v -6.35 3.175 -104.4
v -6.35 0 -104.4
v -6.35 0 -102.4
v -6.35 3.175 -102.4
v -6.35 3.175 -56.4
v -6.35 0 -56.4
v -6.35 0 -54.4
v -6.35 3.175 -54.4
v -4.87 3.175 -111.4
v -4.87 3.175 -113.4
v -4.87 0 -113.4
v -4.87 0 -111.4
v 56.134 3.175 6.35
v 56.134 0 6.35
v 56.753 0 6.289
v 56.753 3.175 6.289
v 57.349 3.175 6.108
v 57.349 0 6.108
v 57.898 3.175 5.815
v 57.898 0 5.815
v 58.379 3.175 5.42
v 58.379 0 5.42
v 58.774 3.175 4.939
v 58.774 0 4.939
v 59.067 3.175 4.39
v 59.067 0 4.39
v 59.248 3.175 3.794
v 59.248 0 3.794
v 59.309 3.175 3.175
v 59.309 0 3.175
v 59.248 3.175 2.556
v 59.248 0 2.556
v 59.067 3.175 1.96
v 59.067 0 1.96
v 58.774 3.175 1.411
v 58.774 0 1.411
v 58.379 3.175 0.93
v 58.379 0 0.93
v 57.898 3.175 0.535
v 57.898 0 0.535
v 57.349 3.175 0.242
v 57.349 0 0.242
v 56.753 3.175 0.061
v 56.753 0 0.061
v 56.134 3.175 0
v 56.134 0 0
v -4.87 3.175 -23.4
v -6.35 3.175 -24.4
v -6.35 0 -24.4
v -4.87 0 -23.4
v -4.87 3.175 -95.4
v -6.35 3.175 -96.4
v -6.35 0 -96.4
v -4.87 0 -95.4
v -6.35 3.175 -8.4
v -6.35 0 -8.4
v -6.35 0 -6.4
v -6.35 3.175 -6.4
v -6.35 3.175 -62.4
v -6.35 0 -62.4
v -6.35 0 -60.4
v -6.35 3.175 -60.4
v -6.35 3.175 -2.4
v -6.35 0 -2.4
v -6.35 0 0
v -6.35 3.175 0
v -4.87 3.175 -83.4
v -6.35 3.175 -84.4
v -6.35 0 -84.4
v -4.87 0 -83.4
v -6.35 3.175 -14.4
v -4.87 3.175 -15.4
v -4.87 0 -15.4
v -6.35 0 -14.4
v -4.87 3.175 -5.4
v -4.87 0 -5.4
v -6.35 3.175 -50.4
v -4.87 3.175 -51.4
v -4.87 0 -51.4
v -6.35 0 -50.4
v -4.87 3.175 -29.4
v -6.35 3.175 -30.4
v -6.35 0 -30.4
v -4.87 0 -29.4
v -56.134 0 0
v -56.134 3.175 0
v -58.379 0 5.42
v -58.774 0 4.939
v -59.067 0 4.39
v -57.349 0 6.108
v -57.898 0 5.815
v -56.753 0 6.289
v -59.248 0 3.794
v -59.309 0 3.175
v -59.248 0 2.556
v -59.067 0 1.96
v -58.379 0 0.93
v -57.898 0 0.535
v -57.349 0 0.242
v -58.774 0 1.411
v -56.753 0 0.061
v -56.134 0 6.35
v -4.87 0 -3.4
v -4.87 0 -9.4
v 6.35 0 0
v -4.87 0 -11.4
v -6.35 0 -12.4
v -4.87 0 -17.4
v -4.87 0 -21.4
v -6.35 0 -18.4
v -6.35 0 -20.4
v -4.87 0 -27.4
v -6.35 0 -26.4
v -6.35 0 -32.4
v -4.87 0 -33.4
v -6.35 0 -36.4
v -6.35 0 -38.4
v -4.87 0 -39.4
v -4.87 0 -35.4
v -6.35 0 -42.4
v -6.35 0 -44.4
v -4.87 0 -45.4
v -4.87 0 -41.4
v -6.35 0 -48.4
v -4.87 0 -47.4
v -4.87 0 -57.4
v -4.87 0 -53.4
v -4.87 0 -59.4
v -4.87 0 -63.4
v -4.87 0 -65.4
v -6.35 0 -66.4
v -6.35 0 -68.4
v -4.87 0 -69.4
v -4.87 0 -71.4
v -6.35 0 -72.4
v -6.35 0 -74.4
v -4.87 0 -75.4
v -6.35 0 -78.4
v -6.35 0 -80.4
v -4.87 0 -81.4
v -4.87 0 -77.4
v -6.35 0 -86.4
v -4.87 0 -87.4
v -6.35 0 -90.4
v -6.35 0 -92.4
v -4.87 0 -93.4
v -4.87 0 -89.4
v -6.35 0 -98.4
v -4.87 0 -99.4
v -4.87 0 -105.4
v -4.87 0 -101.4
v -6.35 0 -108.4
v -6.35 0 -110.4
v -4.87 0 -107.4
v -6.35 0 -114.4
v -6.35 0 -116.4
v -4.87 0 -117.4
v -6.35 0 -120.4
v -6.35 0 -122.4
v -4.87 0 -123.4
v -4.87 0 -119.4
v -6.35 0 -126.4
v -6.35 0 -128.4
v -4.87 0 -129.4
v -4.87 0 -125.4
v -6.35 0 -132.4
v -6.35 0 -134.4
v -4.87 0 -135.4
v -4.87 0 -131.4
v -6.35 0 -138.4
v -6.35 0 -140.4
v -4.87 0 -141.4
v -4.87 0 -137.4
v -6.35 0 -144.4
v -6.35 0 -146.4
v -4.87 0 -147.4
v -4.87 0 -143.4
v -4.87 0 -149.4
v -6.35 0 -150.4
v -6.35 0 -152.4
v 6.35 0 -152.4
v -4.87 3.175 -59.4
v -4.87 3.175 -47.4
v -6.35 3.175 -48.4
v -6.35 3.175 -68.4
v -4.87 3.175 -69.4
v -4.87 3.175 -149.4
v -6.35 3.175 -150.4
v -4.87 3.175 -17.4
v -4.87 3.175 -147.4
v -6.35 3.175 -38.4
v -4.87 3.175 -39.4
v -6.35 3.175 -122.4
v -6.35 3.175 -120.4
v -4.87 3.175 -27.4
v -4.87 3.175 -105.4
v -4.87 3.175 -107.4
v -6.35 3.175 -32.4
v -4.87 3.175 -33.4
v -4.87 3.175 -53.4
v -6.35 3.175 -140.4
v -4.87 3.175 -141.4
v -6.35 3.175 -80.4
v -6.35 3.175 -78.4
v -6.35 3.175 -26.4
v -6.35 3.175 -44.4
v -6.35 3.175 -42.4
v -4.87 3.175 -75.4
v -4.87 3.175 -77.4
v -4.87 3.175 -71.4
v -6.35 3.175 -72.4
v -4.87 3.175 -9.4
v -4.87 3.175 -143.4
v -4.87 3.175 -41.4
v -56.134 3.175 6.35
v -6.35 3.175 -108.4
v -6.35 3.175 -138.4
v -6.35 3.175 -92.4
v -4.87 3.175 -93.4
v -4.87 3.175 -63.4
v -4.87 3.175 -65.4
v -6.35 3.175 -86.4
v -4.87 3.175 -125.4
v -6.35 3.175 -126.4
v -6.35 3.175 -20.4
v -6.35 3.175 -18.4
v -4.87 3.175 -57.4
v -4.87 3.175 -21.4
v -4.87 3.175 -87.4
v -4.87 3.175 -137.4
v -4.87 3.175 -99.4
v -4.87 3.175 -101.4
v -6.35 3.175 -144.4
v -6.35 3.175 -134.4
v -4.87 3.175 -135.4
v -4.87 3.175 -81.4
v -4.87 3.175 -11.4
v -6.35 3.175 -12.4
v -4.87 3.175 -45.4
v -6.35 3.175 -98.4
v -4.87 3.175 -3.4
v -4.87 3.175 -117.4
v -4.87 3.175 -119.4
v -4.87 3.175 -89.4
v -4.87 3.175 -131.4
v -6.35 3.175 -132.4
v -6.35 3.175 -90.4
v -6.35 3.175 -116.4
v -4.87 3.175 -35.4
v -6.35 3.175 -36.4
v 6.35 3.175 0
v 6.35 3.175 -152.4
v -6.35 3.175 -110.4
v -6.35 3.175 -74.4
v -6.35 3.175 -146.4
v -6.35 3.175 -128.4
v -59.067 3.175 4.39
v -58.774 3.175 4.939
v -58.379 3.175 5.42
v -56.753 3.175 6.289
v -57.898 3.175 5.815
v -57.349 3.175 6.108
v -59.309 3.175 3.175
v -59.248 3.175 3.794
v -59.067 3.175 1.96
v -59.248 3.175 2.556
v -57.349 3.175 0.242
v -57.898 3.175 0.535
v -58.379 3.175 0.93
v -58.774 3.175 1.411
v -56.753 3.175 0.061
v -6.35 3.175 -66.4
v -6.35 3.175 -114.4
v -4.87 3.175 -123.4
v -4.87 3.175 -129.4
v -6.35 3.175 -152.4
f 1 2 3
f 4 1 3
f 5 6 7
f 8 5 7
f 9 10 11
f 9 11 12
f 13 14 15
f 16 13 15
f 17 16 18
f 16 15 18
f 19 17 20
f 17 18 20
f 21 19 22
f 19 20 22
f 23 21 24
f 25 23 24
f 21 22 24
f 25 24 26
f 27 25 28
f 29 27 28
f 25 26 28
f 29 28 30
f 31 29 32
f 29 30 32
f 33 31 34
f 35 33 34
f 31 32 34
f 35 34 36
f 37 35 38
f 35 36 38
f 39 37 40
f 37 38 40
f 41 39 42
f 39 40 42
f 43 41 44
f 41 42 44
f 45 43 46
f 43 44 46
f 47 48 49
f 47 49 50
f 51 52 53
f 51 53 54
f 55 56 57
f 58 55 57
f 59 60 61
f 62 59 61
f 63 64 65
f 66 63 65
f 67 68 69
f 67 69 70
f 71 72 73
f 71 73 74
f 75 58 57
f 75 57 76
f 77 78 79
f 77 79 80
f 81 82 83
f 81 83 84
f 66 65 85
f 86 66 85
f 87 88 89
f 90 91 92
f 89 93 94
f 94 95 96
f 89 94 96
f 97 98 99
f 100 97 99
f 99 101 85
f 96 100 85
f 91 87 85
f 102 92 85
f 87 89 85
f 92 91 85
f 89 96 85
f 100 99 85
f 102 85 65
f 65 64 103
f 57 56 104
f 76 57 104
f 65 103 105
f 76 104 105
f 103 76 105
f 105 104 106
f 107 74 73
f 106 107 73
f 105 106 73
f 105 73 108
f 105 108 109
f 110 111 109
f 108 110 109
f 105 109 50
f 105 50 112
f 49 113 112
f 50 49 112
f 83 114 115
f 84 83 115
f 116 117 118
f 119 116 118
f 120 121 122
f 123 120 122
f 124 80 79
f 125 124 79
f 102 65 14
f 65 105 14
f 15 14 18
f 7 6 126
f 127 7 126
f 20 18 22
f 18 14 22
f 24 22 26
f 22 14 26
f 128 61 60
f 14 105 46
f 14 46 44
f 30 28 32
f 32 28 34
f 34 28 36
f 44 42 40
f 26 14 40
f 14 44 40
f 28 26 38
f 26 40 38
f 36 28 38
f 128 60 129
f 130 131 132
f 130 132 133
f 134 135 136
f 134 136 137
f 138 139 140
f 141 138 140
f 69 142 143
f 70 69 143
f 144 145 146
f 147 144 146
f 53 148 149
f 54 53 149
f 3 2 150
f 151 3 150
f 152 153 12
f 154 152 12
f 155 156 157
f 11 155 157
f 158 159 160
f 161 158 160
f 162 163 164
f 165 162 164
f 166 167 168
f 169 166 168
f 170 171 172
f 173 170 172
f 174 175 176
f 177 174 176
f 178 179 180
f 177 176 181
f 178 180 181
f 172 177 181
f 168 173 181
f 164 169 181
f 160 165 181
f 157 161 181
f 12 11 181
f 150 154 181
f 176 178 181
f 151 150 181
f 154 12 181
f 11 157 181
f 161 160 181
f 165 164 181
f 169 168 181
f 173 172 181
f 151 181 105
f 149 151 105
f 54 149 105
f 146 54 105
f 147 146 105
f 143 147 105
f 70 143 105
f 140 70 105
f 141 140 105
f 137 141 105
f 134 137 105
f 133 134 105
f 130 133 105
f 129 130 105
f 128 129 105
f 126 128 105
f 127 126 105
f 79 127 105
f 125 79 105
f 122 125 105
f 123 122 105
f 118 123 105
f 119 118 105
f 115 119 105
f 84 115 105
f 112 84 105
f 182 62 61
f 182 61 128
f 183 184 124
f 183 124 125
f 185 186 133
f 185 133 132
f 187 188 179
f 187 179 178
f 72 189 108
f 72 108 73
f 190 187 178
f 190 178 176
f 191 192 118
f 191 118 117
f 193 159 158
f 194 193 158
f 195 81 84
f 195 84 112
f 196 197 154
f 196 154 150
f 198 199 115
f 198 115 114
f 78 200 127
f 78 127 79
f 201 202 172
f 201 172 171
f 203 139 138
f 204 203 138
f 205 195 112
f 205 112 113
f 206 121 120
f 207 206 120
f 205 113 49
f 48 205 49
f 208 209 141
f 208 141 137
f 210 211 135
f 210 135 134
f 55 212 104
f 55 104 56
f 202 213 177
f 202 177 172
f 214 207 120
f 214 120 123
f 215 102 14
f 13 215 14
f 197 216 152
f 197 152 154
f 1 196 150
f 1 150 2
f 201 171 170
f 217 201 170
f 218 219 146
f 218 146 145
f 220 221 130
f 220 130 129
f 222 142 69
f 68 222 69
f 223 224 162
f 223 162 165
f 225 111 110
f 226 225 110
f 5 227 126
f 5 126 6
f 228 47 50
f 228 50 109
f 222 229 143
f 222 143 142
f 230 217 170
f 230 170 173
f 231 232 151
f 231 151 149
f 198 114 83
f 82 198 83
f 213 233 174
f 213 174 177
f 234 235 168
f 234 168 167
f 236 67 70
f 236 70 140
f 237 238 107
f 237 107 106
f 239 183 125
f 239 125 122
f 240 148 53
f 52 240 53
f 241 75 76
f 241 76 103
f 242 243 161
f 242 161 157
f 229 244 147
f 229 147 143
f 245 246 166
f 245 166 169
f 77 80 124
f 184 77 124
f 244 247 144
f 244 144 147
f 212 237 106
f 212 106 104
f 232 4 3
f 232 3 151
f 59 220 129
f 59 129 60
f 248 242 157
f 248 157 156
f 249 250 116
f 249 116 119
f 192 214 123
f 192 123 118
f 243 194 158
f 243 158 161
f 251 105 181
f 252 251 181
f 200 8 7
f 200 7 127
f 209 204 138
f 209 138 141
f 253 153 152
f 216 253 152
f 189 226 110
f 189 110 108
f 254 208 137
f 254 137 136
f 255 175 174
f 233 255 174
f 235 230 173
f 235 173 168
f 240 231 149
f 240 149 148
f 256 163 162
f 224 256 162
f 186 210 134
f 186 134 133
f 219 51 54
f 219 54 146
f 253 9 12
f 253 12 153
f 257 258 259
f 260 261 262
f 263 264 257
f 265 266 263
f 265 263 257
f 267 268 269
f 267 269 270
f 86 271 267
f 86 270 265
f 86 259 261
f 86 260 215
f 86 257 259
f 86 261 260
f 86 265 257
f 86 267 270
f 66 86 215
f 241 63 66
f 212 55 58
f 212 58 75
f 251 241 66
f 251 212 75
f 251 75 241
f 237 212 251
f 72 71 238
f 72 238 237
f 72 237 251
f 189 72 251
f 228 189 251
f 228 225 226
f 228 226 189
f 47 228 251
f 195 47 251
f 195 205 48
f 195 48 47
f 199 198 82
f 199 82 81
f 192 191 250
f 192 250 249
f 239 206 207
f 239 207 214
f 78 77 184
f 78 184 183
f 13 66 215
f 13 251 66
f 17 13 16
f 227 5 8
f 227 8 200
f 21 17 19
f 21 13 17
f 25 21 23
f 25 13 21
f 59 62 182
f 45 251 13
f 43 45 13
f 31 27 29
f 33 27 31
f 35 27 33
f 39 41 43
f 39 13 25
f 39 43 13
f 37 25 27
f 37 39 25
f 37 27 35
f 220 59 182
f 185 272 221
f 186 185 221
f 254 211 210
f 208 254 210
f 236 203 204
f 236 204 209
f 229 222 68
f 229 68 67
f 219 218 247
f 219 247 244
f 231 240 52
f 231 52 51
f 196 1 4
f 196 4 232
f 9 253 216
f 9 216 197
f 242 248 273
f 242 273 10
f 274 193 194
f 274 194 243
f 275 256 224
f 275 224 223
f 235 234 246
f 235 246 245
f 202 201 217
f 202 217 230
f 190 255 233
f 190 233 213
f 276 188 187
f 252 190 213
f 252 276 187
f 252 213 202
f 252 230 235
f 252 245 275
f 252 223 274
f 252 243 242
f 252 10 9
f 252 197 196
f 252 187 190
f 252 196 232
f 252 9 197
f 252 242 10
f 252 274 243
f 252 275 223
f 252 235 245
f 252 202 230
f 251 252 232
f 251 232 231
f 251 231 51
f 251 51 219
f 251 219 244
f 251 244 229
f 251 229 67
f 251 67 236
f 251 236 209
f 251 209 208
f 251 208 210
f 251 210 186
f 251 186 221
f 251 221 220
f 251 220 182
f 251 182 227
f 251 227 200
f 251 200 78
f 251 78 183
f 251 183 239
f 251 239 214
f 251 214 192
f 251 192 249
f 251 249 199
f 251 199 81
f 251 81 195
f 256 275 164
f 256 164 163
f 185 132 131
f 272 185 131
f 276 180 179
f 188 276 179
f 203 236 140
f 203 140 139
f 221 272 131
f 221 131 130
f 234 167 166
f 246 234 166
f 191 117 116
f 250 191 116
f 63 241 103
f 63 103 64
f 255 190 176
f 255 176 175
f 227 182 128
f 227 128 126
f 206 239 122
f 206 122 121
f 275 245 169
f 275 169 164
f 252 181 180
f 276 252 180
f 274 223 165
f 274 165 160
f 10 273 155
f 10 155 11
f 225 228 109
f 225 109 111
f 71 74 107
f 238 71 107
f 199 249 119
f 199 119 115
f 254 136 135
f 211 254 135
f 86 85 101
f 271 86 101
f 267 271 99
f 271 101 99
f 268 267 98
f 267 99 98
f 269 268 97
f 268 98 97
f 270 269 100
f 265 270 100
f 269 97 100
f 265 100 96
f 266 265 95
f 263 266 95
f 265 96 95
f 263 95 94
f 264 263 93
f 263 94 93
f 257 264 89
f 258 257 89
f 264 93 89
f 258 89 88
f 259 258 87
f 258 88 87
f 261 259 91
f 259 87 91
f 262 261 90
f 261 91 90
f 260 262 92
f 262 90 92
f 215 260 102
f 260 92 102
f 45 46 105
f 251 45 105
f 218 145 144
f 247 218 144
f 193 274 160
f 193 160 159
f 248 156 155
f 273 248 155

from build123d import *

# Parameters (mm, degrees)
BOSS_EXTRUDE1_DEPTH = 3.175
CUT_EXTRUDE1_DEPTH  = 3.175
LPATTERN1_COUNT     = 25
LPATTERN1_PITCH     = 6


with BuildPart() as part:
    # Sketch1 → Boss-Extrude1 (new body)
    with BuildSketch(Plane(origin=(0, 0, 0), x_dir=(1, 0, 0), z_dir=(0, 1, 0))):
        with BuildLine():
            Line((-6.35, 0), (-56.134, 0))
            ThreePointArc((-56.134, 0), (-59.309, -3.175), (-56.134, -6.35))
            Line((-56.134, -6.35), (56.134, -6.35))
            ThreePointArc((56.134, -6.35), (59.309, -3.175), (56.134, 0))
            Line((56.134, 0), (6.35, 0))
            Line((6.35, 0), (6.35, 152.4))
            Line((6.35, 152.4), (-6.35, 152.4))
            Line((-6.35, 152.4), (-6.35, 0))
        make_face()
    extrude(amount=BOSS_EXTRUDE1_DEPTH)

    # Sketch2 → Cut-Extrude1 (cut)
    with BuildSketch(Plane(origin=(0, 3.175, 0), x_dir=(1, 0, 0), z_dir=(0, 1, 0))):
        Polygon((-6.35, 150.4), (-4.869501466, 149.4), (-4.869501466, 147.4), (-6.35, 146.4), align=None)
    cut_extrude1 = extrude(amount=-CUT_EXTRUDE1_DEPTH, mode=Mode.SUBTRACT)

    # LPattern1: Cut-Extrude1 ×25
    with Locations(*[(0, 0, i * LPATTERN1_PITCH) for i in range(1, LPATTERN1_COUNT)]):
        add(cut_extrude1, mode=Mode.SUBTRACT)


solid = part.part
